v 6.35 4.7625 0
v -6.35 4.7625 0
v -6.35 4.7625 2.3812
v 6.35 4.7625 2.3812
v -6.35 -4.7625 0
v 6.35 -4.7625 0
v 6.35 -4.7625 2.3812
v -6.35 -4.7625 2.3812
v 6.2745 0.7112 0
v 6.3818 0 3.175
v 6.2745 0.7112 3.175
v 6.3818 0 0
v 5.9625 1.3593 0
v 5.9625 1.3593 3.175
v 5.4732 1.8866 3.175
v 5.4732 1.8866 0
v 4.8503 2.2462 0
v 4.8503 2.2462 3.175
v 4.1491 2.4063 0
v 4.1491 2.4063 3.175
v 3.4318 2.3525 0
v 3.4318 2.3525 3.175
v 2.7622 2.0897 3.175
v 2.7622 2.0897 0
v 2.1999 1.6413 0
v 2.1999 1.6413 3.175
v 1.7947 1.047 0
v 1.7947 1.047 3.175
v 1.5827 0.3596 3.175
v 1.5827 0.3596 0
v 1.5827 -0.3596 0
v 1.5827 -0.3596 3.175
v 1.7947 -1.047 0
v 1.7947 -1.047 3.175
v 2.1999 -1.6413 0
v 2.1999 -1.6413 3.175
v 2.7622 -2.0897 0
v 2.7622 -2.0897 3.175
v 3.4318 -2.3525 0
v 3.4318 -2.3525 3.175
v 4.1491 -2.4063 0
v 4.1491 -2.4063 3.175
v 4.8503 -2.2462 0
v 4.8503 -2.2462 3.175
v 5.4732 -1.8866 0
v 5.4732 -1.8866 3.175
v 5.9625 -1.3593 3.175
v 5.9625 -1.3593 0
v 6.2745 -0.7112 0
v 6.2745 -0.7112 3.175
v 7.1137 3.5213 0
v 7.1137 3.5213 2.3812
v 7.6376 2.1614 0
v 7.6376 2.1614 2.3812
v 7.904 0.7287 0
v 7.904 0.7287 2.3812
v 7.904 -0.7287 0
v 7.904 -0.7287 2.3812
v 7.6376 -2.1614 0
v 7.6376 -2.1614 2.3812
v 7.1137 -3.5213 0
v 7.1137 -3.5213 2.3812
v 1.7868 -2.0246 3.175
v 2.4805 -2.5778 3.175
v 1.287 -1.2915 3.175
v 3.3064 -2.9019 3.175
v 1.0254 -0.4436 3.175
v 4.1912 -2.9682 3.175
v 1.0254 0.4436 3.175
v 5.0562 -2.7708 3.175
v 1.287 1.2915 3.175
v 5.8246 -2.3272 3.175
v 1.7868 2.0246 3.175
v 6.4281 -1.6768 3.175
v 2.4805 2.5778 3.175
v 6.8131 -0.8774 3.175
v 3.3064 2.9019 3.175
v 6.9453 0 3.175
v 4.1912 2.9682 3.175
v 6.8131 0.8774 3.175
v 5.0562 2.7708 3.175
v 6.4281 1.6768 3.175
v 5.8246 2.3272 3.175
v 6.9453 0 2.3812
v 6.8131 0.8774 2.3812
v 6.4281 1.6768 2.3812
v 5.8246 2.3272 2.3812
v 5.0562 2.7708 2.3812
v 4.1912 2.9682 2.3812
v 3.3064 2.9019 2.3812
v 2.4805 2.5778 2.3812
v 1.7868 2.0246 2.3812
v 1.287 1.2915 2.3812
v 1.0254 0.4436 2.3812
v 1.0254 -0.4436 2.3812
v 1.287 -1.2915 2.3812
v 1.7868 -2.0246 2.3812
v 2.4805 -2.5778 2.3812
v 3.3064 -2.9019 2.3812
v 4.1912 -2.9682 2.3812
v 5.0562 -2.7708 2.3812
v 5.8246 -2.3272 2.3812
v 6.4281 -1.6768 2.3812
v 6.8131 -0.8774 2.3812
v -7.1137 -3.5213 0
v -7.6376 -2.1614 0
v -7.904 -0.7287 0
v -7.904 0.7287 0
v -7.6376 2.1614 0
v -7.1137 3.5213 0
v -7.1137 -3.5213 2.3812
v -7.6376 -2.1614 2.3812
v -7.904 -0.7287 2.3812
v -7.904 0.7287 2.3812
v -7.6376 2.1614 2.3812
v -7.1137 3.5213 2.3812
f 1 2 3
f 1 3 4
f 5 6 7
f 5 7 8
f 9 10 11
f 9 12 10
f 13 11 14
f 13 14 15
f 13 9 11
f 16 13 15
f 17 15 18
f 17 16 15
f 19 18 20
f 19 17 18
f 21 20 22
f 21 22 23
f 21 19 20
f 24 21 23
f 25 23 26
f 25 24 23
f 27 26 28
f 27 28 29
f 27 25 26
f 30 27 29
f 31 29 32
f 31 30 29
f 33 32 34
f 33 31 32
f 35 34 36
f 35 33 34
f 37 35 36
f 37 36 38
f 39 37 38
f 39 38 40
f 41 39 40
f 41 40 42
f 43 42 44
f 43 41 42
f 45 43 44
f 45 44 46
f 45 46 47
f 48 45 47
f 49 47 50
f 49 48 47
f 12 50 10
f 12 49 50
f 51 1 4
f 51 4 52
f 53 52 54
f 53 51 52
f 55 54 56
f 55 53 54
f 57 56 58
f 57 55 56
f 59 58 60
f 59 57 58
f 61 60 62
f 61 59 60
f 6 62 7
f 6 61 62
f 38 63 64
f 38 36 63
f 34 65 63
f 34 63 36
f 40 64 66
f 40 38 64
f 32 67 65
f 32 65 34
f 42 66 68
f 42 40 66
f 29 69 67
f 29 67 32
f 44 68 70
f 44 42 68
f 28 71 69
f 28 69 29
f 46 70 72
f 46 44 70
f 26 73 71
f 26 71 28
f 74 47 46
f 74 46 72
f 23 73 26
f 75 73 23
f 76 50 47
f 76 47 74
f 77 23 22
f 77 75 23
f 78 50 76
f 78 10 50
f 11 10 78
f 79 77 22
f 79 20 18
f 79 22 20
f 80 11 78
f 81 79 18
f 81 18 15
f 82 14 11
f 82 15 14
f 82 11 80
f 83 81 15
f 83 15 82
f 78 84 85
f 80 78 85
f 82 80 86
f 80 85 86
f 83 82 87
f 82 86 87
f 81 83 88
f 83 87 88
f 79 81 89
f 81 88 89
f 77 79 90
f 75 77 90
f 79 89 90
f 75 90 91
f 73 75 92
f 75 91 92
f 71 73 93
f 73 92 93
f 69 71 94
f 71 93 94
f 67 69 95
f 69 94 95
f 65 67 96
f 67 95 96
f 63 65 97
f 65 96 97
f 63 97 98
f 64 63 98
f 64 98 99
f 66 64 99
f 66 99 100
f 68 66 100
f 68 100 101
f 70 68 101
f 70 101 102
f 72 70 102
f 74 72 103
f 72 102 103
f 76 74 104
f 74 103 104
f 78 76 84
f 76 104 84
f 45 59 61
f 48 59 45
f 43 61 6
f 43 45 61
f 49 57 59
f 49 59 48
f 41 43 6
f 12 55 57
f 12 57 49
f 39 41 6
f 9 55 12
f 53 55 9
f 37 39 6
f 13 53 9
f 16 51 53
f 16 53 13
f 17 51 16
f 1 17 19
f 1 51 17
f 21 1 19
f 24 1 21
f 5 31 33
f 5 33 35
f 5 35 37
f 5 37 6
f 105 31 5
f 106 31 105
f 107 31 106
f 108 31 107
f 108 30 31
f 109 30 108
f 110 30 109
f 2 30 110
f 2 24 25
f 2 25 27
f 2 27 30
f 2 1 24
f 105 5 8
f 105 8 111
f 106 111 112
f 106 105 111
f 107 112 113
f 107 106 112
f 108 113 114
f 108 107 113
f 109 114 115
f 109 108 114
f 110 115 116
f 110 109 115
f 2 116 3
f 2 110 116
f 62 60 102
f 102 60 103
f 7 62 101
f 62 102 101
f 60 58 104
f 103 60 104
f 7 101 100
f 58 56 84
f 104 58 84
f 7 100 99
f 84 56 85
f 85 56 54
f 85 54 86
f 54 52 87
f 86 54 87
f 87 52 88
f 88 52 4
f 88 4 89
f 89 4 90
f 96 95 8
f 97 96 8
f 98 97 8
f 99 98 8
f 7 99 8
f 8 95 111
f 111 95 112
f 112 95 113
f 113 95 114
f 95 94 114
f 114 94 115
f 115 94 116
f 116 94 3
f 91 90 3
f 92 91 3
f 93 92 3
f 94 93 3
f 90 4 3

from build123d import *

# Parameters (mm, degrees)
SKETCH1_R      = 2.413
EXTRUDE1_DEPTH = 2.38125
SKETCH2_R      = 2.9765625
SKETCH2_R_2    = 2.413
EXTRUDE2_DEPTH = 0.79375


with BuildPart() as part:
    # Sketch1 → Extrude1 (new body)
    with BuildSketch(Plane.XY):
        with BuildLine():
            Line((-6.35, 4.7625), (6.35, 4.7625))
            ThreePointArc((6.35, 4.7625), (7.9375, 0), (6.35, -4.7625))
            Line((6.35, -4.7625), (-6.35, -4.7625))
            ThreePointArc((-6.35, -4.7625), (-7.9375, 0), (-6.35, 4.7625))
        make_face()
        with Locations((3.96875, 0)):
            Circle(SKETCH1_R, mode=Mode.SUBTRACT)
    extrude(amount=EXTRUDE1_DEPTH)

    # Sketch2 → Extrude2 (add)
    with BuildSketch(Plane.XY.offset(2.38125)):
        with Locations((3.96875, 0)):
            Circle(SKETCH2_R)
        with Locations((3.96875, 0)):
            Circle(SKETCH2_R_2, mode=Mode.SUBTRACT)
    extrude(amount=EXTRUDE2_DEPTH)


solid = part.part
